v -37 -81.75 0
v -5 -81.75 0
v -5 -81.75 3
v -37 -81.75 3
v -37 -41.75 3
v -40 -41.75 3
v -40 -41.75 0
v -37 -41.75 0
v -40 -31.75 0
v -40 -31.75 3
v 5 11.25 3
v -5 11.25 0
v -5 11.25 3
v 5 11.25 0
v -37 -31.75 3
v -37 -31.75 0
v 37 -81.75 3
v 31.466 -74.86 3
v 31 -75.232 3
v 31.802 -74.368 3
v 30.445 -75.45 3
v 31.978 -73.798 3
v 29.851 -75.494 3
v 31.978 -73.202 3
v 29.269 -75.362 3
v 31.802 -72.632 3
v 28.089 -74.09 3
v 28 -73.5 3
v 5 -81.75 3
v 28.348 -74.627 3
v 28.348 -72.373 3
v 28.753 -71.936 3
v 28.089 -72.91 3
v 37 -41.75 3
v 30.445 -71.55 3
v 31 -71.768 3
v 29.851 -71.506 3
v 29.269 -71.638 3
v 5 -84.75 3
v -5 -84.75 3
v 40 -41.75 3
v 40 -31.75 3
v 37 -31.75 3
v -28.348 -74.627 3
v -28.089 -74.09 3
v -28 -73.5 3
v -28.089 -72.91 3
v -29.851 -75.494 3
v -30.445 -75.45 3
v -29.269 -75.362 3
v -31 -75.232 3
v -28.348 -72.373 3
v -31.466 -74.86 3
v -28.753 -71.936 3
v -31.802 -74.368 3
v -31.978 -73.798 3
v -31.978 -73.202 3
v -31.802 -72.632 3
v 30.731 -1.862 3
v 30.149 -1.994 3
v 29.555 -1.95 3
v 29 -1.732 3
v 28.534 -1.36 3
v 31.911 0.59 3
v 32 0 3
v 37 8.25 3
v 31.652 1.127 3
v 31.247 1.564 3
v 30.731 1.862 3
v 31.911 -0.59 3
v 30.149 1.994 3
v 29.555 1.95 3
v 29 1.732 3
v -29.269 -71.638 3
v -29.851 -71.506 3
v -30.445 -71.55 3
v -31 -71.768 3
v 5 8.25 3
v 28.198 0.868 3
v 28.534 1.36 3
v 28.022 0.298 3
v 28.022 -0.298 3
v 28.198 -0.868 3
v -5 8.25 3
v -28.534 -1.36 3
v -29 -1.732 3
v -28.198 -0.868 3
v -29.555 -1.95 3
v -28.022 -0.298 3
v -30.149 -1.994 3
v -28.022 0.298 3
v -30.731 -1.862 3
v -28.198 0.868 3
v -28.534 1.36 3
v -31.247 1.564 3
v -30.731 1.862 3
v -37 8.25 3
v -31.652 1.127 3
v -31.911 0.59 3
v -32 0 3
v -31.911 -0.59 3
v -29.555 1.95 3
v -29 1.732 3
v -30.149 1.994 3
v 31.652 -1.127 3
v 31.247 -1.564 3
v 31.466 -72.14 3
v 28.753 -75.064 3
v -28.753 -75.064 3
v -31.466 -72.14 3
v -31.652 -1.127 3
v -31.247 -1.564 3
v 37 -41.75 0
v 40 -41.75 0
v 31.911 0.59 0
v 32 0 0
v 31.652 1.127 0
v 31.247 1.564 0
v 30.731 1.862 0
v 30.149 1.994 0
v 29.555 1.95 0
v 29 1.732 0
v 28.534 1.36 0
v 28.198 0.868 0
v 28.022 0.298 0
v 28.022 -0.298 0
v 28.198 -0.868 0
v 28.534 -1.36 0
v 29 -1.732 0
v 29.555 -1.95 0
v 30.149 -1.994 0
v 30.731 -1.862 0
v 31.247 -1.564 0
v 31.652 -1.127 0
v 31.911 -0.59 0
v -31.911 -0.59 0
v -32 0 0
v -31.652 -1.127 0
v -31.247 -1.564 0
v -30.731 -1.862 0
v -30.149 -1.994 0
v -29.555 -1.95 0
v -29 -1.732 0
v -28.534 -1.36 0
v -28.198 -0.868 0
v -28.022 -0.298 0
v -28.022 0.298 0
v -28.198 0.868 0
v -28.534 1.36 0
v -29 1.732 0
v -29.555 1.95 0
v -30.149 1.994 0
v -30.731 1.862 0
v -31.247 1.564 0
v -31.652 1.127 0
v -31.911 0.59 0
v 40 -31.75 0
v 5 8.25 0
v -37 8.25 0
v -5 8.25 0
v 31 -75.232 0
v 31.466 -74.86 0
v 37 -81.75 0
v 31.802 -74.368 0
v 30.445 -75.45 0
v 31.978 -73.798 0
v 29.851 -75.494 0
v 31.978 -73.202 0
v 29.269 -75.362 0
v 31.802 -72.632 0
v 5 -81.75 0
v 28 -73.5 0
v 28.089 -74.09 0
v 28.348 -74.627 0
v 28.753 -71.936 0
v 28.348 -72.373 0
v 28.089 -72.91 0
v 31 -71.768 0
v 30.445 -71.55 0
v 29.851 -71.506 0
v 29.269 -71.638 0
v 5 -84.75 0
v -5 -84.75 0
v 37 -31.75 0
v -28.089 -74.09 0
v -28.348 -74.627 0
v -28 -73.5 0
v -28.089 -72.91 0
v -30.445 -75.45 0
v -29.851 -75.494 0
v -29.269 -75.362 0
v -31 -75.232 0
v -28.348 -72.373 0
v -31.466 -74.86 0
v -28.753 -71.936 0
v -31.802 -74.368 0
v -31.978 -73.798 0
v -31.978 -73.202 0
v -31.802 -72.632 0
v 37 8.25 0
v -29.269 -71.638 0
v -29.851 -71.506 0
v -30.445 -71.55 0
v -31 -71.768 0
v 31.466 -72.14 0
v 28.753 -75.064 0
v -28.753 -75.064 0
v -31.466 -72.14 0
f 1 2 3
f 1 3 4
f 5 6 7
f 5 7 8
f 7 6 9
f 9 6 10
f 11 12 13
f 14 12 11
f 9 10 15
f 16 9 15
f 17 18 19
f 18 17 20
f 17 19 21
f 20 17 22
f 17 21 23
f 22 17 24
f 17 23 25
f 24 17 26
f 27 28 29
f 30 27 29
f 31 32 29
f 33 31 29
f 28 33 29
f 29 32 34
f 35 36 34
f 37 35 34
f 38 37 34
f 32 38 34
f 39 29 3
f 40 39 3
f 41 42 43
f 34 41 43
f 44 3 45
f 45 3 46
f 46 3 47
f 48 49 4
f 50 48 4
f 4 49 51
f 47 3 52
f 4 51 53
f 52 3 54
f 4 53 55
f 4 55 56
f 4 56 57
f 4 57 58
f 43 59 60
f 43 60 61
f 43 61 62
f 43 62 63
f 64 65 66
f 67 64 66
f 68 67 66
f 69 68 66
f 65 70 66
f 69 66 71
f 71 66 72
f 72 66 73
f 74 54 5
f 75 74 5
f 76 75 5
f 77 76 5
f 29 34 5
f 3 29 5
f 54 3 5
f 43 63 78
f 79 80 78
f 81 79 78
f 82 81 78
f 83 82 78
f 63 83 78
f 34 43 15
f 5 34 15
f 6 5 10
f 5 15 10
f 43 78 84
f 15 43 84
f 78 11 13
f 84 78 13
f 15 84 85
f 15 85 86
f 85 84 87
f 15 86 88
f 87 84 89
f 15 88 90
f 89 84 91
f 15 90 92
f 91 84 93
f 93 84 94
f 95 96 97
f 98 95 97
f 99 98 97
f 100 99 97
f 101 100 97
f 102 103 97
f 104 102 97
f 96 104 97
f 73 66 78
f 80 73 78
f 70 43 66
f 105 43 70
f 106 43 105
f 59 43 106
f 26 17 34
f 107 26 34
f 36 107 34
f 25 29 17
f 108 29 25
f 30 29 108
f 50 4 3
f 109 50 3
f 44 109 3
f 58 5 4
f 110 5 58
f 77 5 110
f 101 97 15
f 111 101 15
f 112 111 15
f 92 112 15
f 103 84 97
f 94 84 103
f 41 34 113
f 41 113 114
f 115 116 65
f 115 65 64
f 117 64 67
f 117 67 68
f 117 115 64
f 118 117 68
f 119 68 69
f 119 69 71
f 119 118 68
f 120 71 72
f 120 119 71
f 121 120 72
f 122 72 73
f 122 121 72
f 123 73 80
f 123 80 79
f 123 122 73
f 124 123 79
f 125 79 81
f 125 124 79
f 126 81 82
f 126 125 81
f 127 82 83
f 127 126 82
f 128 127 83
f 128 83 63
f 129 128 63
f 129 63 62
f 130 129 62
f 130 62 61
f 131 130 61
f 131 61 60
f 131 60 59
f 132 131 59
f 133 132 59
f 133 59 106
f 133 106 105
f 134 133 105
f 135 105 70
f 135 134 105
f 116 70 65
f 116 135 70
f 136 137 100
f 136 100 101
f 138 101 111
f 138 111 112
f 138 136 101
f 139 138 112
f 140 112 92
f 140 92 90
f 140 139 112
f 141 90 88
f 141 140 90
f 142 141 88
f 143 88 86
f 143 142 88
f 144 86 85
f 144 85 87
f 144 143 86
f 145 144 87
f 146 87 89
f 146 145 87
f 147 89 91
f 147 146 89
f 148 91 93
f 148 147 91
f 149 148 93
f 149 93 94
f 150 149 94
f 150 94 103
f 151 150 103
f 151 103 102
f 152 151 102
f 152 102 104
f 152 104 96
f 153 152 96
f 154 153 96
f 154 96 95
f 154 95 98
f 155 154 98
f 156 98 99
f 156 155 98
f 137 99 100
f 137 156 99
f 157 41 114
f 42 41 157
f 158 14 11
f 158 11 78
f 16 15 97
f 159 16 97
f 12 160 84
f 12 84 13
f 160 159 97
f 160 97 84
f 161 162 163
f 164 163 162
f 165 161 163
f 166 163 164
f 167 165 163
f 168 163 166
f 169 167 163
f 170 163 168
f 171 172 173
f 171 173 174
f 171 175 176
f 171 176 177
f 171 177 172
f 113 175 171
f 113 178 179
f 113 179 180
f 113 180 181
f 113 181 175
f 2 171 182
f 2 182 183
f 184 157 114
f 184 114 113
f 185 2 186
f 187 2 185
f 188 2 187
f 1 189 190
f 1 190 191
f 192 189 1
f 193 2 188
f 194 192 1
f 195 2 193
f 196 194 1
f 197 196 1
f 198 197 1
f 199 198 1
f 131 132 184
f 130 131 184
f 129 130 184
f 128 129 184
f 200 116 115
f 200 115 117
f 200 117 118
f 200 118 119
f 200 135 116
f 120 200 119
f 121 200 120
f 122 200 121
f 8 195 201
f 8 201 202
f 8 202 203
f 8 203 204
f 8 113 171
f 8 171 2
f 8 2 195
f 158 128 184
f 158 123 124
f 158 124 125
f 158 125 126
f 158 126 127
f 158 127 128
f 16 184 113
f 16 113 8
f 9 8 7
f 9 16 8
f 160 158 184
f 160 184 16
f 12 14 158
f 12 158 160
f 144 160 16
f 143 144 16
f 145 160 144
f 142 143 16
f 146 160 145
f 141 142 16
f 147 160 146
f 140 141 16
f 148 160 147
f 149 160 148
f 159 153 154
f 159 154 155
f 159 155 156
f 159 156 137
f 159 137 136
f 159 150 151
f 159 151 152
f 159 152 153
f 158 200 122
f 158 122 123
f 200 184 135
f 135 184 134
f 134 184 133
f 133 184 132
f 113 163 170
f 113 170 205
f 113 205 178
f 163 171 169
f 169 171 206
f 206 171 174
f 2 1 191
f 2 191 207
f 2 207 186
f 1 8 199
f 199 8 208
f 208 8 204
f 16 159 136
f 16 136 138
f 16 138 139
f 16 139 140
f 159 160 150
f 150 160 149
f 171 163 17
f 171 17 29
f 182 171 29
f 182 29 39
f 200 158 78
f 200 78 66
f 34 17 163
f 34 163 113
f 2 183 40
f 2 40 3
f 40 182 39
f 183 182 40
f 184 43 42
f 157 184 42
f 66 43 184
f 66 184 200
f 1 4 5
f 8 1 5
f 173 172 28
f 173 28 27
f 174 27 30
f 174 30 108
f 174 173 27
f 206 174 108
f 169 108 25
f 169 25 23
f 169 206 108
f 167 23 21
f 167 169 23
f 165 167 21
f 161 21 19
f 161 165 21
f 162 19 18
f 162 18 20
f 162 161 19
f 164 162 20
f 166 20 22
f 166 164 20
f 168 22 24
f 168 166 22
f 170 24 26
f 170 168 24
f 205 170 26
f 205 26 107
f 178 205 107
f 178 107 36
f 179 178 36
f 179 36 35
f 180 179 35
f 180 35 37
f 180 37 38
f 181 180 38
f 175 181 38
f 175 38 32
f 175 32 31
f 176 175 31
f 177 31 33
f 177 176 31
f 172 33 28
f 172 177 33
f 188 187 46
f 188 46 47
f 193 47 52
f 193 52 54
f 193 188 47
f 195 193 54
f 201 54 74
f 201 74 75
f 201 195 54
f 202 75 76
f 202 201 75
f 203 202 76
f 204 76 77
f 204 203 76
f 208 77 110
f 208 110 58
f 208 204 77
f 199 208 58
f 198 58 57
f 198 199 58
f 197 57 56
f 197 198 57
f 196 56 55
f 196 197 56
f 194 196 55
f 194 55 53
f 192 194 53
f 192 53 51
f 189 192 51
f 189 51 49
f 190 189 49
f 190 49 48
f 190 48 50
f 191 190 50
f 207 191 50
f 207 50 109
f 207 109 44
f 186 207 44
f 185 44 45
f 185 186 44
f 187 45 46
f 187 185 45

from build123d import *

# Parameters (mm, degrees)
SKETCH1_R           = 2
BOSS_EXTRUDE1_DEPTH = 3
SKETCH2_W           = 3
SKETCH2_H           = 96
CUT_EXTRUDE1_DEPTH  = 10
SKETCH3_W           = 3
SKETCH3_H           = 10
BOSS_EXTRUDE2_DEPTH = 3


with BuildPart() as part:
    # Sketch1 → Boss-Extrude1 (new body)
    with BuildSketch(Plane.XY):
        Polygon((5, 8.25), (40, 8.25), (40, -31.75), (37, -31.75), (37, -41.75), (40, -41.75), (40, -81.75), (5, -81.75), (5, -84.75), (-5, -84.75), (-5, -81.75), (-40, -81.75), (-40, -41.75), (-37, -41.75), (-37, -31.75), (-40, -31.75), (-40, 8.25), (-5, 8.25), (-5, 11.25), (5, 11.25), align=None)
        with Locations((30, 0)):
            Circle(SKETCH1_R, mode=Mode.SUBTRACT)
        with Locations(Location((30, -73.5, 0), (0, 0, 180))):
            Circle(SKETCH1_R, mode=Mode.SUBTRACT)
        with Locations((-30, -73.5)):
            Circle(SKETCH1_R, mode=Mode.SUBTRACT)
        with Locations(Location((-30, 0, 0), (0, 0, 180))):
            Circle(SKETCH1_R, mode=Mode.SUBTRACT)
    extrude(amount=BOSS_EXTRUDE1_DEPTH)

    # Sketch2 → Cut-Extrude1 (cut)
    with BuildSketch(Plane.XY.offset(3)):
        with Locations((38.5, -36.75)):
            Rectangle(SKETCH2_W, SKETCH2_H)
        with Locations((-38.5, -36.75)):
            Rectangle(SKETCH2_W, SKETCH2_H)
    extrude(amount=-CUT_EXTRUDE1_DEPTH, mode=Mode.SUBTRACT)

    # Sketch3 → Boss-Extrude2 (add)
    with BuildSketch(Plane.XY.offset(3)):
        with Locations((38.5, -36.75)):
            Rectangle(SKETCH3_W, SKETCH3_H)
        with Locations((-38.5, -36.75)):
            Rectangle(SKETCH3_W, SKETCH3_H)
    extrude(amount=-BOSS_EXTRUDE2_DEPTH)


solid = part.part
